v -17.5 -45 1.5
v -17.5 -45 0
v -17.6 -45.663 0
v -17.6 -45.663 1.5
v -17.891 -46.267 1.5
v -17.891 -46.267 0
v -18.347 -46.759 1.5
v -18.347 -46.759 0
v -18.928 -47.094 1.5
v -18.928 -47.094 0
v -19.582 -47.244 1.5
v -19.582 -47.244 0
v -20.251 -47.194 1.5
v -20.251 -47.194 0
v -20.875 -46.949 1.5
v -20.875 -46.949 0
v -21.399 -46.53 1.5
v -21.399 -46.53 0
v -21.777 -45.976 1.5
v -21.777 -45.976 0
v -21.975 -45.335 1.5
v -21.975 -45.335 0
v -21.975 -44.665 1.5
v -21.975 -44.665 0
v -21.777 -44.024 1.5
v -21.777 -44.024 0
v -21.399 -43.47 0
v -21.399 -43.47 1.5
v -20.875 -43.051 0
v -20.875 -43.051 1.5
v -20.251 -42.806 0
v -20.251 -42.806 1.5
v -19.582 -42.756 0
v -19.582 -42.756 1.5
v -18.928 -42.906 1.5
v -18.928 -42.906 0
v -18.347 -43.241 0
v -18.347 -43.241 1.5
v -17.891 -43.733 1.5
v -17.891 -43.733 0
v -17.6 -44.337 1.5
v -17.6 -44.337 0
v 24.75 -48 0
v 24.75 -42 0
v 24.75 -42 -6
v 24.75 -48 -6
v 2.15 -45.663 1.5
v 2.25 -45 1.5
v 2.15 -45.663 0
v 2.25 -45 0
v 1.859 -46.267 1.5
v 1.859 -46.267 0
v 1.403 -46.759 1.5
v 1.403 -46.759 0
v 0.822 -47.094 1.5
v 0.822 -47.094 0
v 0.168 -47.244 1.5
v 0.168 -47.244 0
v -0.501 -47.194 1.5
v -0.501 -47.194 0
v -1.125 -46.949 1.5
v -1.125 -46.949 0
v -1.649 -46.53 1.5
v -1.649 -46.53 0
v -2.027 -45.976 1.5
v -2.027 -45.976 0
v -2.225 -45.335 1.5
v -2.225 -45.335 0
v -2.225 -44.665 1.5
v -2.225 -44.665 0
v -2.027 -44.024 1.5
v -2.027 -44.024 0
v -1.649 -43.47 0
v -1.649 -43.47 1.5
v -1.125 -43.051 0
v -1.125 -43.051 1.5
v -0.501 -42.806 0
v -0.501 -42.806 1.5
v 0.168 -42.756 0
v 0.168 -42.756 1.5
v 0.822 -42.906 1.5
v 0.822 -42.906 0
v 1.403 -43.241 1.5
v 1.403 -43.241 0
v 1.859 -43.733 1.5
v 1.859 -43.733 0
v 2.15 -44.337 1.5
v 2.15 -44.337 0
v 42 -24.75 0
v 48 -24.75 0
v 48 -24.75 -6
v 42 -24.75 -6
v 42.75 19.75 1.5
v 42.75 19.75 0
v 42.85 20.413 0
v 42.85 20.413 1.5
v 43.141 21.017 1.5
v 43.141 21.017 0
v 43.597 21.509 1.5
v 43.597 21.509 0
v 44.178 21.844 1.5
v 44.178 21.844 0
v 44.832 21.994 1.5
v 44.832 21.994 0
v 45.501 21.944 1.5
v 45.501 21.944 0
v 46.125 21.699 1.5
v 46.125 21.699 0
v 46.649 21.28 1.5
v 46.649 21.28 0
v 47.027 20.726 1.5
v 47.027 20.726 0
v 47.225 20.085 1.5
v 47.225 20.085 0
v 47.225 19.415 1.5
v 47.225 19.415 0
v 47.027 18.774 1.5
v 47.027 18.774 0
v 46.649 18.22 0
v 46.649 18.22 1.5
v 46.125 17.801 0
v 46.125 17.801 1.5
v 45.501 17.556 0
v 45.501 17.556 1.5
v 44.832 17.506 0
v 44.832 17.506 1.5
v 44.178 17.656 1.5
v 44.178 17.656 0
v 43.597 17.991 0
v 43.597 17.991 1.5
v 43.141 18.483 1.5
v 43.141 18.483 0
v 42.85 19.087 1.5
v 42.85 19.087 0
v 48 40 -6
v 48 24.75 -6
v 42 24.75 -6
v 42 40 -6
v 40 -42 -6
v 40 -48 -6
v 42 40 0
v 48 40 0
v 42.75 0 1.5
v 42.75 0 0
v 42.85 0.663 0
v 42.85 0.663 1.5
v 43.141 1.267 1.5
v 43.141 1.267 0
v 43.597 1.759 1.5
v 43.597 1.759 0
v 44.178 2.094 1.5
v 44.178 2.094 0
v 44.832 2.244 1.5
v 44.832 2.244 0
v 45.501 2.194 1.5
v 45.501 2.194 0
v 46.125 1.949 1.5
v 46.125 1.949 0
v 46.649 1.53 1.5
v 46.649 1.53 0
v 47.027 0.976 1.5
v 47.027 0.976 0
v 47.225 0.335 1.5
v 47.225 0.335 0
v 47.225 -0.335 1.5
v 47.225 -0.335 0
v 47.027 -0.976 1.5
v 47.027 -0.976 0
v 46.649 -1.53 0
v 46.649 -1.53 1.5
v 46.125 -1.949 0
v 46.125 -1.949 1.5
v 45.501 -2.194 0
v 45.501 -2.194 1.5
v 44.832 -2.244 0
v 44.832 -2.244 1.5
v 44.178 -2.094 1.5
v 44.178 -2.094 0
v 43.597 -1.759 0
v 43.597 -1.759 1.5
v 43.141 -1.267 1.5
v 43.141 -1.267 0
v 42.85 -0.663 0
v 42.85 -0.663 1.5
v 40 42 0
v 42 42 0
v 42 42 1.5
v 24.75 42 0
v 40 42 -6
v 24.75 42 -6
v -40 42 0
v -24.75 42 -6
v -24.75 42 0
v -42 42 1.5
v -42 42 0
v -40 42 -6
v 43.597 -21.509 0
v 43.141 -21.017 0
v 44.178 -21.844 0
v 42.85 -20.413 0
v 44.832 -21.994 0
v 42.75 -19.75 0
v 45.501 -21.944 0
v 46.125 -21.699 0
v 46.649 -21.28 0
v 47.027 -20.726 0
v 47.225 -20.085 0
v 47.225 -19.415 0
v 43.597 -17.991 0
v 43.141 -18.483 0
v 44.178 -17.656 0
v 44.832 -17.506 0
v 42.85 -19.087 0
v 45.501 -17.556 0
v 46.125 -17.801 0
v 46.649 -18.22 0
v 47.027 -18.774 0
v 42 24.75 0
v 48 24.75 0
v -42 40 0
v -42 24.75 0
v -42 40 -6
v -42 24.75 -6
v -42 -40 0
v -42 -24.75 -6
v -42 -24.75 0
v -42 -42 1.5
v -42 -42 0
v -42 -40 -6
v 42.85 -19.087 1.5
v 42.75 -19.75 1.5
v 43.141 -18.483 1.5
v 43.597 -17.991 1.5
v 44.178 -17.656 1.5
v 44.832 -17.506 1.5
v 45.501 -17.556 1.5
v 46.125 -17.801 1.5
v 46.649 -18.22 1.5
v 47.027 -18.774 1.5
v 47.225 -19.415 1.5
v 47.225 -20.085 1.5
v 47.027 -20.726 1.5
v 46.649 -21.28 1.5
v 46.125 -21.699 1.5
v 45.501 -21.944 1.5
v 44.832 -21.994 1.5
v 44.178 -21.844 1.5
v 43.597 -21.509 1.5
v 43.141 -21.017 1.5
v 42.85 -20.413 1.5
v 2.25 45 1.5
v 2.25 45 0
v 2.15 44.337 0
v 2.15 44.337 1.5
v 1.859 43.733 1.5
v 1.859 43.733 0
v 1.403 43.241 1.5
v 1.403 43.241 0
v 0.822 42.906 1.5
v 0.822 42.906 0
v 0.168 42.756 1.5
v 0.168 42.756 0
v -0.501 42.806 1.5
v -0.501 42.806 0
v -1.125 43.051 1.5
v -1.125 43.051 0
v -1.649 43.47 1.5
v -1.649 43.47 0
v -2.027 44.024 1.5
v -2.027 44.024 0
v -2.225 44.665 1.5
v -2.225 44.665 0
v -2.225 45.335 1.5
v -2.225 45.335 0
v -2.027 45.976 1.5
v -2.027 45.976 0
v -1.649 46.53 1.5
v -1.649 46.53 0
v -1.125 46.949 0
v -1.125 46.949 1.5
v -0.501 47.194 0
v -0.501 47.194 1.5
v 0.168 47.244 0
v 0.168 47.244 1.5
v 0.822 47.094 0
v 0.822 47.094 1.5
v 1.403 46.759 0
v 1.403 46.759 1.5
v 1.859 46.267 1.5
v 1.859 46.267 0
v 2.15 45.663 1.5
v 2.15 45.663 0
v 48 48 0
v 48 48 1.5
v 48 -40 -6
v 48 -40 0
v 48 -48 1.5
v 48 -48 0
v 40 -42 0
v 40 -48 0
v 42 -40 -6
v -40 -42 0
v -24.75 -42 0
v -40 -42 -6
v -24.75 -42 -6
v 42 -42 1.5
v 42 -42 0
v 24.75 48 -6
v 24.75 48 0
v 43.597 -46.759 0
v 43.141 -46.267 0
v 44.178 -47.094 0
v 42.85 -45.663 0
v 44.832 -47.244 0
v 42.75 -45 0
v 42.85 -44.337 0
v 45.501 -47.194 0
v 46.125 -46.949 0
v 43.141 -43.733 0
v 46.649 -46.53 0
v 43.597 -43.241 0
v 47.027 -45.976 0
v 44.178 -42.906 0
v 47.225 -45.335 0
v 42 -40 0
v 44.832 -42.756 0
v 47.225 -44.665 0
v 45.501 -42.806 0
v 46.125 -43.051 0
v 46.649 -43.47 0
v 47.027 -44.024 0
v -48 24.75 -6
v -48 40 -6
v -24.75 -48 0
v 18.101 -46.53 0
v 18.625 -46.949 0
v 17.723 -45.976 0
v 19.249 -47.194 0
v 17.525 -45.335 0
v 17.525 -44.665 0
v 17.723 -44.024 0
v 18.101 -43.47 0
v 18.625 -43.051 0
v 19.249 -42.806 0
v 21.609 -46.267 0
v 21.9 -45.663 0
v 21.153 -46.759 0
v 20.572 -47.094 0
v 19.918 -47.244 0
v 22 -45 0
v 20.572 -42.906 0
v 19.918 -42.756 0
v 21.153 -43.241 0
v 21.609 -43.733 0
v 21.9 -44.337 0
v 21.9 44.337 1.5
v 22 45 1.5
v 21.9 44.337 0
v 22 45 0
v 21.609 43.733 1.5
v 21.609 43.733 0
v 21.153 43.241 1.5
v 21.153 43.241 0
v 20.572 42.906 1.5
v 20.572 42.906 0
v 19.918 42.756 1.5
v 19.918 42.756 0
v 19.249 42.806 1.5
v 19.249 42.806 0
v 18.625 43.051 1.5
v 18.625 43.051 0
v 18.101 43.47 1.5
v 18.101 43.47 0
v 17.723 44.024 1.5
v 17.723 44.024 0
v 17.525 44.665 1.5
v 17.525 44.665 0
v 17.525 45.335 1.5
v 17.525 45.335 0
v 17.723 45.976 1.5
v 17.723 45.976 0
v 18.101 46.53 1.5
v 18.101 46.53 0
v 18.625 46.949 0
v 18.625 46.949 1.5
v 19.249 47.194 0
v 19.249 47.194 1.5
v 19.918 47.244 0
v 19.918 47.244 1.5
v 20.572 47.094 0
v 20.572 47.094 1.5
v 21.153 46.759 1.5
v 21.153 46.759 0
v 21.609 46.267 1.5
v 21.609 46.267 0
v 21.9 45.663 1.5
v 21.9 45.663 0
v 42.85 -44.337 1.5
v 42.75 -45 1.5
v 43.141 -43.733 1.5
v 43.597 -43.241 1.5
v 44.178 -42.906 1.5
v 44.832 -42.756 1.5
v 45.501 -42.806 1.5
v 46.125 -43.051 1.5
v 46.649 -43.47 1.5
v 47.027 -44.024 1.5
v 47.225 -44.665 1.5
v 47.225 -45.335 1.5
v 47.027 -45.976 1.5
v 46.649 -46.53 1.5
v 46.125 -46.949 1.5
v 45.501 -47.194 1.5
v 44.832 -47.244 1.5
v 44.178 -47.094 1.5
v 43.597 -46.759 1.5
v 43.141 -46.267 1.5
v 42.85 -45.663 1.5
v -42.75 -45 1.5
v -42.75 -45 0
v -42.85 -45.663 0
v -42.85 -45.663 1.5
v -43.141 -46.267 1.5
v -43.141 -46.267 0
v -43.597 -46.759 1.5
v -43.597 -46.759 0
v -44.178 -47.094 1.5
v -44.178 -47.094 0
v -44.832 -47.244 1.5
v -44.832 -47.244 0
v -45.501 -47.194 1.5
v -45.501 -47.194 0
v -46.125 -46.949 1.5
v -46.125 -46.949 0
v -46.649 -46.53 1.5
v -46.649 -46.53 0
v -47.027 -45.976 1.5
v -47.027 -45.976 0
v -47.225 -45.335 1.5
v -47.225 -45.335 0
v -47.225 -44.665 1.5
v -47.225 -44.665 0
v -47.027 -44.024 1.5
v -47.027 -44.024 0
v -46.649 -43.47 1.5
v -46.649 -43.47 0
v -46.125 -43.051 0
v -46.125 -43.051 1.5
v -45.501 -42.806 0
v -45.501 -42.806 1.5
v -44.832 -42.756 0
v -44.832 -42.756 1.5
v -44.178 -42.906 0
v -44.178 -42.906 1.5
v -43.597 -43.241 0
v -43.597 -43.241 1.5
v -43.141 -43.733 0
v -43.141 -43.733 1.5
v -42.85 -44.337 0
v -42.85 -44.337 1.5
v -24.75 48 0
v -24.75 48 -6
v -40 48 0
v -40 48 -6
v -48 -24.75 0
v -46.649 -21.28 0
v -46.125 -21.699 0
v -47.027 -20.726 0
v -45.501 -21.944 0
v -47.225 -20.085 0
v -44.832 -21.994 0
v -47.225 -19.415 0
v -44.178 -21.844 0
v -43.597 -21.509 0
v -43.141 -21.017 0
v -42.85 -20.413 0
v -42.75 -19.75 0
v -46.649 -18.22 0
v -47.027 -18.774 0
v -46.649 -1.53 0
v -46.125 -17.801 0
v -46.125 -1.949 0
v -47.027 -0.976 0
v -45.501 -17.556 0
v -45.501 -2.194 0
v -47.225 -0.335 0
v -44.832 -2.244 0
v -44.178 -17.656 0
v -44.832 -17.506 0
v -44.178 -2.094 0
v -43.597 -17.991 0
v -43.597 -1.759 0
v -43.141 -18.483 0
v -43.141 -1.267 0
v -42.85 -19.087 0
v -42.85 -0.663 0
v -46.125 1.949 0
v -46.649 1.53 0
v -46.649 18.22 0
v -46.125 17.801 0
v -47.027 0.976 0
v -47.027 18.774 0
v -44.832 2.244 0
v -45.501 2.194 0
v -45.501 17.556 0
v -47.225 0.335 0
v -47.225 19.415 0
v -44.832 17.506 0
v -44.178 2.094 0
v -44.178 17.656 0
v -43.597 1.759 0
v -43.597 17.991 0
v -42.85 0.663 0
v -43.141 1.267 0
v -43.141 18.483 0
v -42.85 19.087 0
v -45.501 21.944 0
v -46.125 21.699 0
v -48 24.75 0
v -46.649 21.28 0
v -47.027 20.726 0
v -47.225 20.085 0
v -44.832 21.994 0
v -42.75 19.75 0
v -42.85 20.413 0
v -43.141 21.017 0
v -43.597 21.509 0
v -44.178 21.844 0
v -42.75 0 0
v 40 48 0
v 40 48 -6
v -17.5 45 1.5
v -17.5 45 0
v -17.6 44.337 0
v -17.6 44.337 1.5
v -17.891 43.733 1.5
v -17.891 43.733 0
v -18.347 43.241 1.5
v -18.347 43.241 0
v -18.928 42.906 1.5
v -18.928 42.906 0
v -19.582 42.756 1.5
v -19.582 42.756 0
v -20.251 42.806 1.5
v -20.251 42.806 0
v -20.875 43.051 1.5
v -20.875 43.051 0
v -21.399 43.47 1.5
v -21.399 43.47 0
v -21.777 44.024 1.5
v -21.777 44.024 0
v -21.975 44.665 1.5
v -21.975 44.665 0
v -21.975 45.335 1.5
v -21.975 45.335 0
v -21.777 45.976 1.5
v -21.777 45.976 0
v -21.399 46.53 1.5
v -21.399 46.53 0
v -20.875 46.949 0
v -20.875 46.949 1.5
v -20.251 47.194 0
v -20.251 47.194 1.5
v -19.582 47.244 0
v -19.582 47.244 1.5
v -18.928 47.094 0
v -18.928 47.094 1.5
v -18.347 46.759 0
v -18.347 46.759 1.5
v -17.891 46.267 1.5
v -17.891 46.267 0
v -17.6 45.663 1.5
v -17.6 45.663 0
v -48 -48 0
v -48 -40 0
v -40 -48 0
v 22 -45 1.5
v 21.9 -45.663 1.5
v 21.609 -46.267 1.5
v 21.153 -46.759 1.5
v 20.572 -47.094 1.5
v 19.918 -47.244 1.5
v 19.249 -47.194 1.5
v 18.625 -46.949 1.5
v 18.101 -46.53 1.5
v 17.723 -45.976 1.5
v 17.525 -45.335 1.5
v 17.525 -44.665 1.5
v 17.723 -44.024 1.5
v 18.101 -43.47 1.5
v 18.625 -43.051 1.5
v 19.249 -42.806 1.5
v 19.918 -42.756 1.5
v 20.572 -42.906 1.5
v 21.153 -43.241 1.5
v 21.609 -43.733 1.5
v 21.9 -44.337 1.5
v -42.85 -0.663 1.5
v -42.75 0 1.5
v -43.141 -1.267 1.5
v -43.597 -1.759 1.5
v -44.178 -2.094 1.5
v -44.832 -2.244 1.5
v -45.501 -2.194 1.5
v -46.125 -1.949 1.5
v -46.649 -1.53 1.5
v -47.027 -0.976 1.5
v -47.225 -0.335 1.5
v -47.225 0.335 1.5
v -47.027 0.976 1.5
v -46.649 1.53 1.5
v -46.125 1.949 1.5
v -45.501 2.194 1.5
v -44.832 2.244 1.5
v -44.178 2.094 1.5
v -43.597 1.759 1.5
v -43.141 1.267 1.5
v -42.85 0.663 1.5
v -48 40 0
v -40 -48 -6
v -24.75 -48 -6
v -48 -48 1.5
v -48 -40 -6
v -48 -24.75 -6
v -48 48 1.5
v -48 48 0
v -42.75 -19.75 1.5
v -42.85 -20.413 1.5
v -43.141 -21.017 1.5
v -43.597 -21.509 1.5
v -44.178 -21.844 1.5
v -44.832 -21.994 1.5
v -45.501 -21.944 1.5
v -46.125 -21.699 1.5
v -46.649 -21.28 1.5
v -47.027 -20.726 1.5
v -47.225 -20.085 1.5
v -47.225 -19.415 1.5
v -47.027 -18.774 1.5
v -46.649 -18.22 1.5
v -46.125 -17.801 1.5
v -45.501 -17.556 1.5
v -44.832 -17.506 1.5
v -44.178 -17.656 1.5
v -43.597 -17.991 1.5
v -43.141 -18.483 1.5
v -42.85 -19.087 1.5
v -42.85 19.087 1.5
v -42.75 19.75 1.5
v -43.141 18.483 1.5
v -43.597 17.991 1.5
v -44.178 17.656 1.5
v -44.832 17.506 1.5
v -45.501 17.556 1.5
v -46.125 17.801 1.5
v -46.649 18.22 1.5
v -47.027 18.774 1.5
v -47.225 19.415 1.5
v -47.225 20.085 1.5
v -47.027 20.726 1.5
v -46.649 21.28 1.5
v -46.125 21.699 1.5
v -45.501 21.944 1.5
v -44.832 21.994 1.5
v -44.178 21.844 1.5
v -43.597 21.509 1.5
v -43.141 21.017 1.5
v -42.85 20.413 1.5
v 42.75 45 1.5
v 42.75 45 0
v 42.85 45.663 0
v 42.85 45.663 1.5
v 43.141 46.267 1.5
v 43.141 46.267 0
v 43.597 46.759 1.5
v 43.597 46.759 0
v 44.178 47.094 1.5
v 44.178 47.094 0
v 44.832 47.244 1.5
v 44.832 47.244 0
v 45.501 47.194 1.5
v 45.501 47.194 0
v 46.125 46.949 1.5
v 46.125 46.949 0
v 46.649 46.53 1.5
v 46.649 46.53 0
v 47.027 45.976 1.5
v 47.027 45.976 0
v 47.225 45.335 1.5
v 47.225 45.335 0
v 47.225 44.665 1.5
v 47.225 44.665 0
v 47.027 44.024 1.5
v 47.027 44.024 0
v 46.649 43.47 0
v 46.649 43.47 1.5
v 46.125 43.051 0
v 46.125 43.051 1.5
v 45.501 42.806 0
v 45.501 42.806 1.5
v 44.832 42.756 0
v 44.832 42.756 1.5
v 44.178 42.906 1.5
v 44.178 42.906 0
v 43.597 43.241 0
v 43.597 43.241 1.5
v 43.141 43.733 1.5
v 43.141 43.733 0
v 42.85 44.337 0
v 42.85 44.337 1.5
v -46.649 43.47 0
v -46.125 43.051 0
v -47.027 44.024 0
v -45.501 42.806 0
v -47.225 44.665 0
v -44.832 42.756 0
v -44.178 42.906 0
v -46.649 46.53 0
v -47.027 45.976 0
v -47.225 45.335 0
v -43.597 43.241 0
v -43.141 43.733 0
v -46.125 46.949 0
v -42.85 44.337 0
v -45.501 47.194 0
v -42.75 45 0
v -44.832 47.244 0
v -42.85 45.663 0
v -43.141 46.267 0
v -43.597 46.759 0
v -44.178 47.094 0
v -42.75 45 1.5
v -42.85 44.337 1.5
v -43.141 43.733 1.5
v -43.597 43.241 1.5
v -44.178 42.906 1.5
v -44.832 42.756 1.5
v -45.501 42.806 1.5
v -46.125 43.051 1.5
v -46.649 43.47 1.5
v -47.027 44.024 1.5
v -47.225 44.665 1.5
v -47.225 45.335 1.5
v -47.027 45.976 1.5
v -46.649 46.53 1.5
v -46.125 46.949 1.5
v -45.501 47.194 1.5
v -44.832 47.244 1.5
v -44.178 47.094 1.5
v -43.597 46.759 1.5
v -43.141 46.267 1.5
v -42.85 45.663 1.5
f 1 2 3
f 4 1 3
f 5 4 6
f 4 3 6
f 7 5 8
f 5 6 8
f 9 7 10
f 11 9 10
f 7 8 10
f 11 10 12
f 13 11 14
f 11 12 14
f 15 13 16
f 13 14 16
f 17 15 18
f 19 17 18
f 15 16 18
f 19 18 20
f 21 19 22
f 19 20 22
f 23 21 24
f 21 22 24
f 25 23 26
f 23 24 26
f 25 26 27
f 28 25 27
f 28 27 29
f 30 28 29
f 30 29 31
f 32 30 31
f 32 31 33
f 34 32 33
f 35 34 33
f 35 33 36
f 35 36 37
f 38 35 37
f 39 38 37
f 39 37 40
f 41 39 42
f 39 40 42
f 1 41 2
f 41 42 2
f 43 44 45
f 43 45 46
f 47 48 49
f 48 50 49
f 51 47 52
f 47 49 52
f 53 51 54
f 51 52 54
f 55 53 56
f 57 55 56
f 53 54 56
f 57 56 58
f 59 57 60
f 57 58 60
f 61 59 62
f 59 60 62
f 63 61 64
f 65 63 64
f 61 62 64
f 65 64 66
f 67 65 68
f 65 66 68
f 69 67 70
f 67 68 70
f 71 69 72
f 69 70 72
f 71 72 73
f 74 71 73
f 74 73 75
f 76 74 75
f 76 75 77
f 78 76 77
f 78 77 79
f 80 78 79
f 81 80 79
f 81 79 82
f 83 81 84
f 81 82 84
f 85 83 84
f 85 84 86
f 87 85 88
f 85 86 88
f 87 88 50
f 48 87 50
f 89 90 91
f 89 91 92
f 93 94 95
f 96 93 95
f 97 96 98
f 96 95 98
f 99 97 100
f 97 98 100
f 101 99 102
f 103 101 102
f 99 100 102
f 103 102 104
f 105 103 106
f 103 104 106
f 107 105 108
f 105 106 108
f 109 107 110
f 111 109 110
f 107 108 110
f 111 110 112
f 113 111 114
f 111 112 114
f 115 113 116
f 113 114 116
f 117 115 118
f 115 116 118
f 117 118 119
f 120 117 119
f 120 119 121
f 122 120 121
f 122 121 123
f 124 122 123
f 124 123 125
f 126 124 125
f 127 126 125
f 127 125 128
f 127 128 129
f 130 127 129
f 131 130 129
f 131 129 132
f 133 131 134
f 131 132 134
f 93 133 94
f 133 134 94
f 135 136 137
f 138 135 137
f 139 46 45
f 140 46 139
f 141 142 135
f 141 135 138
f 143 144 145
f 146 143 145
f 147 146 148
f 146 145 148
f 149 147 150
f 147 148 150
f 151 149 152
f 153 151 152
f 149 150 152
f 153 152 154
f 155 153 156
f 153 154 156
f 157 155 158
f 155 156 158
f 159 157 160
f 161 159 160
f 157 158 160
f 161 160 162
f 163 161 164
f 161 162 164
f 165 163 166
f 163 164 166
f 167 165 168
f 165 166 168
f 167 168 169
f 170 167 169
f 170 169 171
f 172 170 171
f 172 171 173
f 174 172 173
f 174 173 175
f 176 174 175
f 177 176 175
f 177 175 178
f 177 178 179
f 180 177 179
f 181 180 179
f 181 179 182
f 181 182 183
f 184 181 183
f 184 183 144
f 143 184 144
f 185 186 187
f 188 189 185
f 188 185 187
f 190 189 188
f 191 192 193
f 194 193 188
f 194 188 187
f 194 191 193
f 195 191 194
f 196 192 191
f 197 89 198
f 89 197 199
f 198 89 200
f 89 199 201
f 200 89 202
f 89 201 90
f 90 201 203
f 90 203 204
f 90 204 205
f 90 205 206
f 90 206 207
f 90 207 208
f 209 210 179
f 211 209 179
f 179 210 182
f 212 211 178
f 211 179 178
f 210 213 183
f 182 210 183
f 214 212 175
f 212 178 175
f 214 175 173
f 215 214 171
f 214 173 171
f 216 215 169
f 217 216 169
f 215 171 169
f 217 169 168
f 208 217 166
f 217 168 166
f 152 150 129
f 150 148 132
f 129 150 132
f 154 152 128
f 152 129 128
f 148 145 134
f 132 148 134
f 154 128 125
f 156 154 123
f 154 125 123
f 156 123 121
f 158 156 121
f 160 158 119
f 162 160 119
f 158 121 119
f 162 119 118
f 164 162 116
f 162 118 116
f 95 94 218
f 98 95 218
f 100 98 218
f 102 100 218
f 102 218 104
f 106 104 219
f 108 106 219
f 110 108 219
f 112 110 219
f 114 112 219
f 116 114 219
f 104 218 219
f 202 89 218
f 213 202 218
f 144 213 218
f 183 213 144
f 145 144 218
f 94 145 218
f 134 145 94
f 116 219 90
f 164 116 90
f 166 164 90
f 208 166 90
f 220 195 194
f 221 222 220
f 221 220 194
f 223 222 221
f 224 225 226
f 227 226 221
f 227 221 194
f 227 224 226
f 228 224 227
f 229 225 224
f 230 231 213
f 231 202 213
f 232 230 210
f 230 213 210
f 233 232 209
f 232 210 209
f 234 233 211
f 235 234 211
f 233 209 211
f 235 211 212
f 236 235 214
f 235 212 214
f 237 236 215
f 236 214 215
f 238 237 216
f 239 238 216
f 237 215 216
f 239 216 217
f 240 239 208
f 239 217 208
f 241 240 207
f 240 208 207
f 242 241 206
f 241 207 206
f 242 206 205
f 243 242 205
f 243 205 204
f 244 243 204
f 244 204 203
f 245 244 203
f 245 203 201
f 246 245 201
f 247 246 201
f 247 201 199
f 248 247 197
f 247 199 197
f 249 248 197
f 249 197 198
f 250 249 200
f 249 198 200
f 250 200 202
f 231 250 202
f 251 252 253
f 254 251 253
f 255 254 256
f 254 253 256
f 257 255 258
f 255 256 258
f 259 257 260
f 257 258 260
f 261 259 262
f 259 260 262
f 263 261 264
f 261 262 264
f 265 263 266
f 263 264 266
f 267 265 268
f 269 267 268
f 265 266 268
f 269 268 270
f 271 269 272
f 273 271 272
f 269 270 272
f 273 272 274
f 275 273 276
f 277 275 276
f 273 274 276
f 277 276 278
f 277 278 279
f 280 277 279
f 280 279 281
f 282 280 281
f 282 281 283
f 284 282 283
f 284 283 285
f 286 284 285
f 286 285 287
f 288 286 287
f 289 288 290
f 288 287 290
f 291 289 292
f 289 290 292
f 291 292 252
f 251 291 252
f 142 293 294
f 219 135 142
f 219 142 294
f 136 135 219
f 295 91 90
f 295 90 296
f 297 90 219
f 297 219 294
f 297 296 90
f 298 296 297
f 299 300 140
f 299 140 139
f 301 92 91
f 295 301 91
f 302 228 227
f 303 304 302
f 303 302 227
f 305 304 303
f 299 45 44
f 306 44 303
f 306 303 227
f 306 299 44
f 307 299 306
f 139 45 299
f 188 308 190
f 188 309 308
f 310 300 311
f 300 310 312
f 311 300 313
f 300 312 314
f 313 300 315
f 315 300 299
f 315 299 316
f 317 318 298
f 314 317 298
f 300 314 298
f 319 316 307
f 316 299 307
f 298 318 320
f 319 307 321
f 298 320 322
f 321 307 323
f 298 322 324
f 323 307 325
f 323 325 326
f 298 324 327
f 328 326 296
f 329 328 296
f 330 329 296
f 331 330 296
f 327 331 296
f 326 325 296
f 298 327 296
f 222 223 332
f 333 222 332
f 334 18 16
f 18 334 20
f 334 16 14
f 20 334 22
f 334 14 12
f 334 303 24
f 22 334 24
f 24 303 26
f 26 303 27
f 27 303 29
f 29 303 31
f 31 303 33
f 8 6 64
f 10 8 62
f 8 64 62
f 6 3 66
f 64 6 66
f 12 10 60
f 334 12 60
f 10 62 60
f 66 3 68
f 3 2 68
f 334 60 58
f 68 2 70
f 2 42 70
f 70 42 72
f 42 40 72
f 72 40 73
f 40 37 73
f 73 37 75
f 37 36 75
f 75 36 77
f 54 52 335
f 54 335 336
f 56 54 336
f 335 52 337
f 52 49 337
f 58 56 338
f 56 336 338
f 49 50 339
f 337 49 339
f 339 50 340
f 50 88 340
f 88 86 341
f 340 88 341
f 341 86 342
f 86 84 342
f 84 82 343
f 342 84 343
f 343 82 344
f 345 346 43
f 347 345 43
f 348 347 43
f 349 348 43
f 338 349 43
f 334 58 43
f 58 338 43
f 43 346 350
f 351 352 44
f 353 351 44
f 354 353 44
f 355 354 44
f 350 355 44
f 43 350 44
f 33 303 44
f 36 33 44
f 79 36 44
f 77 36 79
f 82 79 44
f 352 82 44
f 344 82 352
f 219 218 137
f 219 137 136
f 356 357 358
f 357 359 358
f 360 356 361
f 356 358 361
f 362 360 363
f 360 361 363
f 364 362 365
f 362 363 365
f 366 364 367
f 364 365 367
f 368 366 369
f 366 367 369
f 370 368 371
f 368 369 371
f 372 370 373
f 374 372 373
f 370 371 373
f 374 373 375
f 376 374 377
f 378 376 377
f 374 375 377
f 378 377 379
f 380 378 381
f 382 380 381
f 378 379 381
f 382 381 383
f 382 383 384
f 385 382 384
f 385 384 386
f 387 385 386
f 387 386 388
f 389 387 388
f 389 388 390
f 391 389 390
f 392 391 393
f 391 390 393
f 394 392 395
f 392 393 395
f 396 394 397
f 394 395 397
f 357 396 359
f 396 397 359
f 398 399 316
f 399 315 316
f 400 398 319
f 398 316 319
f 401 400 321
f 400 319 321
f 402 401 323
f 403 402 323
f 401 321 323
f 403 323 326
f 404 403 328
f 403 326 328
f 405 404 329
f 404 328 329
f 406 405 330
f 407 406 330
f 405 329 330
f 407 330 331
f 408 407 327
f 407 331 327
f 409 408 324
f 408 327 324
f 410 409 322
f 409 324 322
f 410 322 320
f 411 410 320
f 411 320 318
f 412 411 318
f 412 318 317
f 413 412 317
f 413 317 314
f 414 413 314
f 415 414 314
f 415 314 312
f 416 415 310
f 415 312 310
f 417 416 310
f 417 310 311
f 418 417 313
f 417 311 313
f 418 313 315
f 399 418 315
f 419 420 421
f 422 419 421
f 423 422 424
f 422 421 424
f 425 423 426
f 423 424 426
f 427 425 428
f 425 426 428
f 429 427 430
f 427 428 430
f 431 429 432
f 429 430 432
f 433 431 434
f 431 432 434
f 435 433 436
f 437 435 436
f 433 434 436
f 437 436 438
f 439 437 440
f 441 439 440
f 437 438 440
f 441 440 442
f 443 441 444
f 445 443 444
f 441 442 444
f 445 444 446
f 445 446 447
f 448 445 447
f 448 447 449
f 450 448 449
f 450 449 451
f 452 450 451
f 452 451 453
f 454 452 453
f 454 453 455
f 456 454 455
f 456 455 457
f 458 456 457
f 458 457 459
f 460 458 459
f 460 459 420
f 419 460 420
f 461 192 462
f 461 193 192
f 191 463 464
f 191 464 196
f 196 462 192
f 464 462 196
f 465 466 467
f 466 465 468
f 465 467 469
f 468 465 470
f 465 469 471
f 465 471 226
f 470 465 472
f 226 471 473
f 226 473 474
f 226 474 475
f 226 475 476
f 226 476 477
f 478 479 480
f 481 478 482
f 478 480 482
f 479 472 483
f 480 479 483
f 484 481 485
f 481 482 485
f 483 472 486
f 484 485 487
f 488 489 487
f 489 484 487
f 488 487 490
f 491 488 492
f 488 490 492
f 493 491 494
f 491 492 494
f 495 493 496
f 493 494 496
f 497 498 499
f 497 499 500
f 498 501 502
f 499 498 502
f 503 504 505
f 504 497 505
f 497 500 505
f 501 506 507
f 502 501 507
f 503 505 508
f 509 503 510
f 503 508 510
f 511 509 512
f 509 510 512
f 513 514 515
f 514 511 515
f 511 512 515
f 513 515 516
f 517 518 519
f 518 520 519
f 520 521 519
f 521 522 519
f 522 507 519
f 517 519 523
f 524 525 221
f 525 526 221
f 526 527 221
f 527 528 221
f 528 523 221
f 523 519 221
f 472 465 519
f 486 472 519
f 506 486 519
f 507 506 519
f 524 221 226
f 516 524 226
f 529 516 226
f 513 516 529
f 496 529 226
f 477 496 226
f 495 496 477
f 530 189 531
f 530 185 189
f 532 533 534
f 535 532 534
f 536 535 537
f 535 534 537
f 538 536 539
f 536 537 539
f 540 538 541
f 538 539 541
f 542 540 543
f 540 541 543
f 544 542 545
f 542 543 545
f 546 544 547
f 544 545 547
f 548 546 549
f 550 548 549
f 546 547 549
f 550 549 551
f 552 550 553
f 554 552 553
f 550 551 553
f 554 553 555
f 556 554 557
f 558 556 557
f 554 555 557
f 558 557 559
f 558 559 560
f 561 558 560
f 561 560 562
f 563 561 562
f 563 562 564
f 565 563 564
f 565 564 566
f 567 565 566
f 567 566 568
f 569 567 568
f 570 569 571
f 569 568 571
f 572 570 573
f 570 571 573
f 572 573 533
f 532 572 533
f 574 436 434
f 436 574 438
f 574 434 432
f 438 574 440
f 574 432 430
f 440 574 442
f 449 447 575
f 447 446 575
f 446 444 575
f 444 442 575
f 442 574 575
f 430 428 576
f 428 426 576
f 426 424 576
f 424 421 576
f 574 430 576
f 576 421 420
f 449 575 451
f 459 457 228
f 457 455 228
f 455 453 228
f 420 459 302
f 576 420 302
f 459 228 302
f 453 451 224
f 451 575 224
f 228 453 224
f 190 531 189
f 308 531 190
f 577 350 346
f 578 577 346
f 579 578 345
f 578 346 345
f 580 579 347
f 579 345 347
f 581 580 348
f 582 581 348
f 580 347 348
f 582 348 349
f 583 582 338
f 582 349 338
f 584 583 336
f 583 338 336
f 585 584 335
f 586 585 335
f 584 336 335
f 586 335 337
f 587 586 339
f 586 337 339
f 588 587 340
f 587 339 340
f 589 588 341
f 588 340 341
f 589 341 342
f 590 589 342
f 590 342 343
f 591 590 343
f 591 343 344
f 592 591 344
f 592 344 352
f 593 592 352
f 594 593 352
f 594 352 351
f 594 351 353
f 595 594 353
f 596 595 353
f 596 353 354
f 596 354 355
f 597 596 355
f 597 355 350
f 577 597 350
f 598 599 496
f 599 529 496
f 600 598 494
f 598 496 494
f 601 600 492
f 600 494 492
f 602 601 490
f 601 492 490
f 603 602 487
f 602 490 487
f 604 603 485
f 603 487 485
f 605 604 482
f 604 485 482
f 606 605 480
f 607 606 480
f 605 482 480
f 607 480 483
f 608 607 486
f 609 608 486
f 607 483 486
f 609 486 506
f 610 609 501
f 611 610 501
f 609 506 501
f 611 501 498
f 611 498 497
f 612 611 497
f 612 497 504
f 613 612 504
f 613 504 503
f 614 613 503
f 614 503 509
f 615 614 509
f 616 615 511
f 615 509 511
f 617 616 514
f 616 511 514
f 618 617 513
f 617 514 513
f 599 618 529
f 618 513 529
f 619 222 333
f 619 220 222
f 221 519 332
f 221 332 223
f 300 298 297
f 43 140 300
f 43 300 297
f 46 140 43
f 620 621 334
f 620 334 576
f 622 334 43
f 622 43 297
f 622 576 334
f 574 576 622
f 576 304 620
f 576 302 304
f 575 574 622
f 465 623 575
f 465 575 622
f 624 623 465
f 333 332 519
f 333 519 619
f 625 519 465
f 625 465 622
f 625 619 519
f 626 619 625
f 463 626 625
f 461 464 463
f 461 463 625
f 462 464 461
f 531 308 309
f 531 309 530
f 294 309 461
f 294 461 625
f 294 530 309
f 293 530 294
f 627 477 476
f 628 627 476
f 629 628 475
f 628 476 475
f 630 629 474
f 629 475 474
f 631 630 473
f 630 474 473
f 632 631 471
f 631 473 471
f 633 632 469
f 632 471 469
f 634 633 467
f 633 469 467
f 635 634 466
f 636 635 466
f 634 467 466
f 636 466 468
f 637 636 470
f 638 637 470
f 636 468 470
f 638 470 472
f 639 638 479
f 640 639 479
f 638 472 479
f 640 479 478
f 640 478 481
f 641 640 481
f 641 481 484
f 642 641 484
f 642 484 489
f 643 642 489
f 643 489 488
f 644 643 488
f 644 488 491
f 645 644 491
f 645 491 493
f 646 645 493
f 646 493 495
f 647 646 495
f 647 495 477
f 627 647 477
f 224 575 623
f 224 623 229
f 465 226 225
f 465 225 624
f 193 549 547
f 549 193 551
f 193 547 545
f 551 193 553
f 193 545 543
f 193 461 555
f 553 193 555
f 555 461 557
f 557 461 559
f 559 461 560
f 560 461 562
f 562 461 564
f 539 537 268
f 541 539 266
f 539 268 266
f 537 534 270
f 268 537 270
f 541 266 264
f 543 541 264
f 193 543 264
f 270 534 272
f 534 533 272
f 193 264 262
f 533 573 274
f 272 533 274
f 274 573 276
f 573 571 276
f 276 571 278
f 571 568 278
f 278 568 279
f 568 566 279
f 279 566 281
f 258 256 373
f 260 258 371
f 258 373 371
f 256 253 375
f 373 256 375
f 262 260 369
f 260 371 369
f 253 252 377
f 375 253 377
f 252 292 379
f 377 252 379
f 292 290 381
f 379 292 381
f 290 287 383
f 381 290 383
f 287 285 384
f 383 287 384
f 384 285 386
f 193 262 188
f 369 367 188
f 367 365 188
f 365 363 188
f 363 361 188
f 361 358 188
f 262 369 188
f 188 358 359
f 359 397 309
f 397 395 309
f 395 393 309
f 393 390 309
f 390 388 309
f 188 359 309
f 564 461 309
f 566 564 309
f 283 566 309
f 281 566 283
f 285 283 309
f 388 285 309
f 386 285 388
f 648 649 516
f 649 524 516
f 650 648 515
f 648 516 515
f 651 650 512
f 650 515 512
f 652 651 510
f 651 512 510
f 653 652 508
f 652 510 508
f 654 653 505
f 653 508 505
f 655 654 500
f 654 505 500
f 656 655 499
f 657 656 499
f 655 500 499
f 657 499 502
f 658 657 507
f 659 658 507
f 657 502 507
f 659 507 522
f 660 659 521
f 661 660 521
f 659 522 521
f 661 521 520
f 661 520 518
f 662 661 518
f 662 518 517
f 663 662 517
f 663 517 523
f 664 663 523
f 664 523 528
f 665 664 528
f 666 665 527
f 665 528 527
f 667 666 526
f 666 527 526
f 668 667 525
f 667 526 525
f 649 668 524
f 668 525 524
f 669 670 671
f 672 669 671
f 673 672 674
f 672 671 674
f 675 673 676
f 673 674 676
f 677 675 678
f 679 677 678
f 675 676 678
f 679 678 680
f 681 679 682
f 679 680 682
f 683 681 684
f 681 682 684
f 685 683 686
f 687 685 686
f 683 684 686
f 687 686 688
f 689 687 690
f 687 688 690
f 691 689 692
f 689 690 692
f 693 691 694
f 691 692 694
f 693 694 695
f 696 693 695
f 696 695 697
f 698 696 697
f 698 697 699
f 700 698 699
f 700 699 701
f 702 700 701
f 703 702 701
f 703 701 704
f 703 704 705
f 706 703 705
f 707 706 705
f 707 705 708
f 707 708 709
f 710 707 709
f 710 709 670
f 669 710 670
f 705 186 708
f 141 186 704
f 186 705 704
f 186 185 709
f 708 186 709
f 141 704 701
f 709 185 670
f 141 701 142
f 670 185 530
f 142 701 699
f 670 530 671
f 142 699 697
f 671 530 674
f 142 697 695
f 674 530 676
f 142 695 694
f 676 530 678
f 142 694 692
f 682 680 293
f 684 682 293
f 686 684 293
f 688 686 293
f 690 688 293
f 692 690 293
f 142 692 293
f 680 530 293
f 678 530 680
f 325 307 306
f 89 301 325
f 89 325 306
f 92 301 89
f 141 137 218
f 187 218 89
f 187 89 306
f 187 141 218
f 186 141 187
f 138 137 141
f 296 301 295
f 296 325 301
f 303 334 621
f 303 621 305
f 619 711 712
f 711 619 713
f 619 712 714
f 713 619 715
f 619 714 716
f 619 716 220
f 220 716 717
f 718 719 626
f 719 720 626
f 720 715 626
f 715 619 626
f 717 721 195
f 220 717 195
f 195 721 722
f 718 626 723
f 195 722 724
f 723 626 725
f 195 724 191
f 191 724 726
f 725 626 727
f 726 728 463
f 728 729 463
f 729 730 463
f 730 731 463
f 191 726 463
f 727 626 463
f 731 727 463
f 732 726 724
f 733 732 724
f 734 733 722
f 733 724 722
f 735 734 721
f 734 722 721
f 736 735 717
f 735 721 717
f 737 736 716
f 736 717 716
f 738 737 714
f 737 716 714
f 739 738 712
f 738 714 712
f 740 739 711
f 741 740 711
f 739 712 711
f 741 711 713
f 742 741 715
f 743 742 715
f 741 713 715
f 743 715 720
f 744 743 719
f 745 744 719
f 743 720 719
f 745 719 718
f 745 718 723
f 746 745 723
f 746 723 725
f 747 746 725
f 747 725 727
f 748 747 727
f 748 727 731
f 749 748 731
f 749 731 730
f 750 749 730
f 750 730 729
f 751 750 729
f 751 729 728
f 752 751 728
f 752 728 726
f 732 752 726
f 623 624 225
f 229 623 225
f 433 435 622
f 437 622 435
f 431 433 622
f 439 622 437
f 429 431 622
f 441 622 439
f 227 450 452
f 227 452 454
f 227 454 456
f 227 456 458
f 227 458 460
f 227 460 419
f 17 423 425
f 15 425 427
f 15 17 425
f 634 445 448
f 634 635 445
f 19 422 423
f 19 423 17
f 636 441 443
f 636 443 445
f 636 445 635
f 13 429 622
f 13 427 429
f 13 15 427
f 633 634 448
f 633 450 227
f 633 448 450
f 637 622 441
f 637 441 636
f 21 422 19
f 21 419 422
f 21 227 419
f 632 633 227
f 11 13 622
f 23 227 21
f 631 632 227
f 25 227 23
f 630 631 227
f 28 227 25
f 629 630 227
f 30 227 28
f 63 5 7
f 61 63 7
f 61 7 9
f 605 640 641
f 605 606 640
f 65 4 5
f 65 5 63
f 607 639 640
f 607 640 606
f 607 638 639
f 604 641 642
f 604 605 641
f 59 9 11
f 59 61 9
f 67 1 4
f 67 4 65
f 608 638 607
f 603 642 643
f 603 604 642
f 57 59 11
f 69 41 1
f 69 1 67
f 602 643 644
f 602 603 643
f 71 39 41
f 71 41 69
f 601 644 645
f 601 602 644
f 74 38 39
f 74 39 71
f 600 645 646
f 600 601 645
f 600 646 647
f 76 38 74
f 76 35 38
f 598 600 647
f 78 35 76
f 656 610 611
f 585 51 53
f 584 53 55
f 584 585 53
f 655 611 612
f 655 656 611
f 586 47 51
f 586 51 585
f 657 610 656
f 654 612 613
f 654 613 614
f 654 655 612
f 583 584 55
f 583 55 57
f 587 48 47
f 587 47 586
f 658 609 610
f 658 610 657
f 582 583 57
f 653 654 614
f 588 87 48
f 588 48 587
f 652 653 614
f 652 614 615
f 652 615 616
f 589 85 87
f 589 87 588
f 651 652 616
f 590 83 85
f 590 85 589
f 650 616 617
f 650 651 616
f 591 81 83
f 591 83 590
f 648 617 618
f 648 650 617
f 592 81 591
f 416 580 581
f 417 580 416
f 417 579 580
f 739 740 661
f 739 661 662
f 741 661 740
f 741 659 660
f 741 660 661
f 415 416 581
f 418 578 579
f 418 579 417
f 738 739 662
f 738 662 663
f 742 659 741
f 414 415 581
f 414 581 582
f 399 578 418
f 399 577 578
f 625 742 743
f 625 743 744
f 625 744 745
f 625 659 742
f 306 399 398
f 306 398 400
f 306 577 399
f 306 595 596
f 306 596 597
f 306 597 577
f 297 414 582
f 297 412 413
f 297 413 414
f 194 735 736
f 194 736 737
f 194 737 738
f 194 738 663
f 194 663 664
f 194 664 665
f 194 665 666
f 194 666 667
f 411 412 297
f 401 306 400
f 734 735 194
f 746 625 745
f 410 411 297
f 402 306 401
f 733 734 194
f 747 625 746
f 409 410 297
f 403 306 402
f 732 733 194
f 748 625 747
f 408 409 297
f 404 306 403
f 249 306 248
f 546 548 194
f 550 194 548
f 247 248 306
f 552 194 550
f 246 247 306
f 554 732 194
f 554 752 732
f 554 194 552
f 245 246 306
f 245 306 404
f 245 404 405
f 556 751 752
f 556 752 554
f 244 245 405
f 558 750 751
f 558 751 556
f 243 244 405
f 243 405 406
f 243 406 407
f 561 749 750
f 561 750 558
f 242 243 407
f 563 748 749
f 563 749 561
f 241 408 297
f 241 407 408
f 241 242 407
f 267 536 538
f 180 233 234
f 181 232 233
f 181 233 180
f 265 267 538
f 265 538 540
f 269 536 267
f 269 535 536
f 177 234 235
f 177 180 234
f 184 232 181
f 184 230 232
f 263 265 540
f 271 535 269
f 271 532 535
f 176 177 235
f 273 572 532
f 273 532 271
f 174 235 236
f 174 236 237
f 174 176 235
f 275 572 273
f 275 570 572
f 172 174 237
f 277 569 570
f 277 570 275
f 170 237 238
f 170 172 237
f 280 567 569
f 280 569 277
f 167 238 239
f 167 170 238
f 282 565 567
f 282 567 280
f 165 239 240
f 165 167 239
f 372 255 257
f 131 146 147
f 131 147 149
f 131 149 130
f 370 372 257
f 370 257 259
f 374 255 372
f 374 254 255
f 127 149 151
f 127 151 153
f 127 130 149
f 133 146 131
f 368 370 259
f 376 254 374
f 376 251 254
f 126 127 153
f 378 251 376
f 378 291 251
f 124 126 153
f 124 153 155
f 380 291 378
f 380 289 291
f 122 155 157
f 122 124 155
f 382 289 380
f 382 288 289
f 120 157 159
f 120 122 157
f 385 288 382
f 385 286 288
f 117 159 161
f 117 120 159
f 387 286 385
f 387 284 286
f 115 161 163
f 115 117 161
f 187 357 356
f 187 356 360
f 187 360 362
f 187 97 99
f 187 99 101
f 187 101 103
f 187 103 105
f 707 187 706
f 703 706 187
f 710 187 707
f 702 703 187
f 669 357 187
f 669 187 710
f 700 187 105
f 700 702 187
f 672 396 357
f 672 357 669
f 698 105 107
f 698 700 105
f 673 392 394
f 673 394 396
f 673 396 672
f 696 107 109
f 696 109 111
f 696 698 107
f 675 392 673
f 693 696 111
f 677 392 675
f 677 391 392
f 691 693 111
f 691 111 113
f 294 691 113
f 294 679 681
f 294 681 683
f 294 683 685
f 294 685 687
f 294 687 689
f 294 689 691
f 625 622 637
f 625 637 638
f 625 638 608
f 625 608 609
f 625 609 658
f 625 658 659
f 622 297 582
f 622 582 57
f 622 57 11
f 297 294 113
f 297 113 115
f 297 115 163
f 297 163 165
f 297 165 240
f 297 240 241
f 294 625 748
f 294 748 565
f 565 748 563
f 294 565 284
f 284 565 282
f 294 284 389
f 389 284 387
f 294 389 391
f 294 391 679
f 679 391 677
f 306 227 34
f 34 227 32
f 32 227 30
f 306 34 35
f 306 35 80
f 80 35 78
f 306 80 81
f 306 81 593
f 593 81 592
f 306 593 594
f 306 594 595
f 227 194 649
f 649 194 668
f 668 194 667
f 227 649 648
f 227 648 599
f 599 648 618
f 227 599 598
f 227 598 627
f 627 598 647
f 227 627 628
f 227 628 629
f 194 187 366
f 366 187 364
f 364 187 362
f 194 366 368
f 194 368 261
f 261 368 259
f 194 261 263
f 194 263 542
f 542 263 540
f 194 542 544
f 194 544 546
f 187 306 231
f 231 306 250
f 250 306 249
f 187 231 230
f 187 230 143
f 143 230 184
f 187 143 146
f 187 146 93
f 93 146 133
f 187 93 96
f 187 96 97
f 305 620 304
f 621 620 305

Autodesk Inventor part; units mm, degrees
ref_plane "YZ Plane" through (0, 0, 0) normal (1, 0, 0) x (0, 1, 0)
ref_plane "XZ Plane" through (0, 0, 0) normal (0, 1, 0) x (-1, 0, 0)
ref_plane "XY Plane" through (0, 0, 0) normal (0, 0, 1) x (1, 0, 0)
sketch "Sketch1" plane through (0, 0, 0) normal (0, 0, 1) x (1, 0, 0)
  line L0 (-48, 48) -> (48, 48)
  line L1 (48, 48) -> (48, -48)
  line L2 (48, -48) -> (-48, -48)
  line L3 (-48, -48) -> (-48, 48)
  line L4 (42, 42) -> (-42, 42)
  line L5 (-42, 42) -> (-42, -42)
  line L6 (-42, -42) -> (42, -42)
  line L7 (42, -42) -> (42, 42)
  line L8 (0, 152.7233) -> (0, -72.1628) construction
  line L9 (-77.8847, 0) -> (88.8171, 0) construction
  line L10 (-48, 45) -> (48, 45) construction
  circle A0 centre (0, 45) radius 2.25
  circle A1 centre (-19.75, 45) radius 2.25
  circle A2 centre (19.75, 45) radius 2.25
  line L11 (-45, 48) -> (-45, -48) construction
  circle A3 centre (-45, 45) radius 2.25
  circle A4 centre (-45, 0) radius 2.25
  line L12 (-48, -45) -> (48, -45) construction
  circle A5 centre (-45, -45) radius 2.25
  circle A6 centre (-45, 19.75) radius 2.25
  circle A7 centre (-45, -19.75) radius 2.25
  point P0 (0, 0)
  point P1 (0, 48)
  point P2 (48, 0)
  dimension "d0" = 96
  dimension "d1" = 96
  dimension "d2" = 6
  dimension "d5" = 3
  dimension "d6" = 4.5
  dimension "d7" = 4.5
  dimension "d8" = 4.5
  dimension "d9" = 22
  dimension "d10" = 22
  dimension "d11" = 3
  dimension "d12" = 4.5
  dimension "d13" = 4.5
  dimension "d14" = 3
  dimension "d15" = 4.5
  dimension "d31" = 4.5
  dimension "d32" = 4.5
  dimension "d33" = 22
  dimension "d34" = 22
extrude "Extrusion1" add sketch "Sketch1" along normal blind 1.5 contours L0 L1 L2 L3 | A0 | A1 | A2 | A3 | A4 | A5 | A6 | A7
extrude "Extrusion2" cut sketch "Sketch1" along normal blind 10 contours A0 | A1 | A2
mirror "Mirror1" about plane through (0, 0, 0) normal (0, 1, 0) of "Extrusion2"
extrude "Extrusion3" cut sketch "Sketch1" along normal blind 10 contours A3 | A4 | A5 | A6 | A7
mirror "Mirror2" about plane through (0, 0, 0) normal (1, 0, 0) of "Extrusion3"
sketch "Sketch2" plane through (0, 0, 0) normal (0, 0, -1) x (-1, 0, 0)
  circle A0 centre (-45, 19.75) radius 2.25 projected
  circle A1 centre (-45, 0) radius 2.25 projected
  circle A2 centre (-45, 45) radius 2.25 projected
  circle A3 centre (0, 45) radius 2.25 projected
  circle A4 centre (-19.75, 45) radius 2.25 projected
  line L0 (48, 48) -> (-48, 48) projected
  line L1 (-48, 48) -> (-48, -48) projected
  line L2 (-42, -42) -> (-42, 42) projected
  line L3 (-42, 42) -> (42, 42) projected
  line L4 (-48, 40) -> (-42, 40)
  line L5 (-42, 40) -> (-42, 24.75)
  line L6 (-42, 24.75) -> (-48, 24.75)
  line L7 (-48, 24.75) -> (-48, 40)
  line L8 (-48, 14.75) -> (-42, 14.75)
  line L9 (-42, 14.75) -> (-42, 5)
  line L10 (-42, 5) -> (-48, 5)
  line L11 (-48, 5) -> (-48, 14.75)
  line L12 (-40, 48) -> (-24.75, 48)
  line L13 (-24.75, 48) -> (-24.75, 42)
  line L14 (-24.75, 42) -> (-40, 42)
  line L15 (-40, 42) -> (-40, 48)
  line L16 (-14.75, 48) -> (-5, 48)
  line L17 (-5, 48) -> (-5, 42)
  line L18 (-5, 42) -> (-14.75, 42)
  line L19 (-14.75, 42) -> (-14.75, 48)
  dimension "d35" = 5
  dimension "d36" = 5
  dimension "d37" = 5
  dimension "d38" = 5
  dimension "d39" = 5
  dimension "d40" = 5
  dimension "d41" = 5
  dimension "d42" = 5
extrude "Extrusion4" add sketch "Sketch2" along normal blind 6 contours L13 L3 L15 L0 | L4 L2 L6 L1
mirror "Mirror3" about plane through (0, 0, 0) normal (1, 0, 0) of "Extrusion4"
mirror "Mirror4" about plane through (0, 0, 0) normal (0, 1, 0) of "Extrusion4", "Mirror3"
properties part number "Base" material "ABS Plastic"
